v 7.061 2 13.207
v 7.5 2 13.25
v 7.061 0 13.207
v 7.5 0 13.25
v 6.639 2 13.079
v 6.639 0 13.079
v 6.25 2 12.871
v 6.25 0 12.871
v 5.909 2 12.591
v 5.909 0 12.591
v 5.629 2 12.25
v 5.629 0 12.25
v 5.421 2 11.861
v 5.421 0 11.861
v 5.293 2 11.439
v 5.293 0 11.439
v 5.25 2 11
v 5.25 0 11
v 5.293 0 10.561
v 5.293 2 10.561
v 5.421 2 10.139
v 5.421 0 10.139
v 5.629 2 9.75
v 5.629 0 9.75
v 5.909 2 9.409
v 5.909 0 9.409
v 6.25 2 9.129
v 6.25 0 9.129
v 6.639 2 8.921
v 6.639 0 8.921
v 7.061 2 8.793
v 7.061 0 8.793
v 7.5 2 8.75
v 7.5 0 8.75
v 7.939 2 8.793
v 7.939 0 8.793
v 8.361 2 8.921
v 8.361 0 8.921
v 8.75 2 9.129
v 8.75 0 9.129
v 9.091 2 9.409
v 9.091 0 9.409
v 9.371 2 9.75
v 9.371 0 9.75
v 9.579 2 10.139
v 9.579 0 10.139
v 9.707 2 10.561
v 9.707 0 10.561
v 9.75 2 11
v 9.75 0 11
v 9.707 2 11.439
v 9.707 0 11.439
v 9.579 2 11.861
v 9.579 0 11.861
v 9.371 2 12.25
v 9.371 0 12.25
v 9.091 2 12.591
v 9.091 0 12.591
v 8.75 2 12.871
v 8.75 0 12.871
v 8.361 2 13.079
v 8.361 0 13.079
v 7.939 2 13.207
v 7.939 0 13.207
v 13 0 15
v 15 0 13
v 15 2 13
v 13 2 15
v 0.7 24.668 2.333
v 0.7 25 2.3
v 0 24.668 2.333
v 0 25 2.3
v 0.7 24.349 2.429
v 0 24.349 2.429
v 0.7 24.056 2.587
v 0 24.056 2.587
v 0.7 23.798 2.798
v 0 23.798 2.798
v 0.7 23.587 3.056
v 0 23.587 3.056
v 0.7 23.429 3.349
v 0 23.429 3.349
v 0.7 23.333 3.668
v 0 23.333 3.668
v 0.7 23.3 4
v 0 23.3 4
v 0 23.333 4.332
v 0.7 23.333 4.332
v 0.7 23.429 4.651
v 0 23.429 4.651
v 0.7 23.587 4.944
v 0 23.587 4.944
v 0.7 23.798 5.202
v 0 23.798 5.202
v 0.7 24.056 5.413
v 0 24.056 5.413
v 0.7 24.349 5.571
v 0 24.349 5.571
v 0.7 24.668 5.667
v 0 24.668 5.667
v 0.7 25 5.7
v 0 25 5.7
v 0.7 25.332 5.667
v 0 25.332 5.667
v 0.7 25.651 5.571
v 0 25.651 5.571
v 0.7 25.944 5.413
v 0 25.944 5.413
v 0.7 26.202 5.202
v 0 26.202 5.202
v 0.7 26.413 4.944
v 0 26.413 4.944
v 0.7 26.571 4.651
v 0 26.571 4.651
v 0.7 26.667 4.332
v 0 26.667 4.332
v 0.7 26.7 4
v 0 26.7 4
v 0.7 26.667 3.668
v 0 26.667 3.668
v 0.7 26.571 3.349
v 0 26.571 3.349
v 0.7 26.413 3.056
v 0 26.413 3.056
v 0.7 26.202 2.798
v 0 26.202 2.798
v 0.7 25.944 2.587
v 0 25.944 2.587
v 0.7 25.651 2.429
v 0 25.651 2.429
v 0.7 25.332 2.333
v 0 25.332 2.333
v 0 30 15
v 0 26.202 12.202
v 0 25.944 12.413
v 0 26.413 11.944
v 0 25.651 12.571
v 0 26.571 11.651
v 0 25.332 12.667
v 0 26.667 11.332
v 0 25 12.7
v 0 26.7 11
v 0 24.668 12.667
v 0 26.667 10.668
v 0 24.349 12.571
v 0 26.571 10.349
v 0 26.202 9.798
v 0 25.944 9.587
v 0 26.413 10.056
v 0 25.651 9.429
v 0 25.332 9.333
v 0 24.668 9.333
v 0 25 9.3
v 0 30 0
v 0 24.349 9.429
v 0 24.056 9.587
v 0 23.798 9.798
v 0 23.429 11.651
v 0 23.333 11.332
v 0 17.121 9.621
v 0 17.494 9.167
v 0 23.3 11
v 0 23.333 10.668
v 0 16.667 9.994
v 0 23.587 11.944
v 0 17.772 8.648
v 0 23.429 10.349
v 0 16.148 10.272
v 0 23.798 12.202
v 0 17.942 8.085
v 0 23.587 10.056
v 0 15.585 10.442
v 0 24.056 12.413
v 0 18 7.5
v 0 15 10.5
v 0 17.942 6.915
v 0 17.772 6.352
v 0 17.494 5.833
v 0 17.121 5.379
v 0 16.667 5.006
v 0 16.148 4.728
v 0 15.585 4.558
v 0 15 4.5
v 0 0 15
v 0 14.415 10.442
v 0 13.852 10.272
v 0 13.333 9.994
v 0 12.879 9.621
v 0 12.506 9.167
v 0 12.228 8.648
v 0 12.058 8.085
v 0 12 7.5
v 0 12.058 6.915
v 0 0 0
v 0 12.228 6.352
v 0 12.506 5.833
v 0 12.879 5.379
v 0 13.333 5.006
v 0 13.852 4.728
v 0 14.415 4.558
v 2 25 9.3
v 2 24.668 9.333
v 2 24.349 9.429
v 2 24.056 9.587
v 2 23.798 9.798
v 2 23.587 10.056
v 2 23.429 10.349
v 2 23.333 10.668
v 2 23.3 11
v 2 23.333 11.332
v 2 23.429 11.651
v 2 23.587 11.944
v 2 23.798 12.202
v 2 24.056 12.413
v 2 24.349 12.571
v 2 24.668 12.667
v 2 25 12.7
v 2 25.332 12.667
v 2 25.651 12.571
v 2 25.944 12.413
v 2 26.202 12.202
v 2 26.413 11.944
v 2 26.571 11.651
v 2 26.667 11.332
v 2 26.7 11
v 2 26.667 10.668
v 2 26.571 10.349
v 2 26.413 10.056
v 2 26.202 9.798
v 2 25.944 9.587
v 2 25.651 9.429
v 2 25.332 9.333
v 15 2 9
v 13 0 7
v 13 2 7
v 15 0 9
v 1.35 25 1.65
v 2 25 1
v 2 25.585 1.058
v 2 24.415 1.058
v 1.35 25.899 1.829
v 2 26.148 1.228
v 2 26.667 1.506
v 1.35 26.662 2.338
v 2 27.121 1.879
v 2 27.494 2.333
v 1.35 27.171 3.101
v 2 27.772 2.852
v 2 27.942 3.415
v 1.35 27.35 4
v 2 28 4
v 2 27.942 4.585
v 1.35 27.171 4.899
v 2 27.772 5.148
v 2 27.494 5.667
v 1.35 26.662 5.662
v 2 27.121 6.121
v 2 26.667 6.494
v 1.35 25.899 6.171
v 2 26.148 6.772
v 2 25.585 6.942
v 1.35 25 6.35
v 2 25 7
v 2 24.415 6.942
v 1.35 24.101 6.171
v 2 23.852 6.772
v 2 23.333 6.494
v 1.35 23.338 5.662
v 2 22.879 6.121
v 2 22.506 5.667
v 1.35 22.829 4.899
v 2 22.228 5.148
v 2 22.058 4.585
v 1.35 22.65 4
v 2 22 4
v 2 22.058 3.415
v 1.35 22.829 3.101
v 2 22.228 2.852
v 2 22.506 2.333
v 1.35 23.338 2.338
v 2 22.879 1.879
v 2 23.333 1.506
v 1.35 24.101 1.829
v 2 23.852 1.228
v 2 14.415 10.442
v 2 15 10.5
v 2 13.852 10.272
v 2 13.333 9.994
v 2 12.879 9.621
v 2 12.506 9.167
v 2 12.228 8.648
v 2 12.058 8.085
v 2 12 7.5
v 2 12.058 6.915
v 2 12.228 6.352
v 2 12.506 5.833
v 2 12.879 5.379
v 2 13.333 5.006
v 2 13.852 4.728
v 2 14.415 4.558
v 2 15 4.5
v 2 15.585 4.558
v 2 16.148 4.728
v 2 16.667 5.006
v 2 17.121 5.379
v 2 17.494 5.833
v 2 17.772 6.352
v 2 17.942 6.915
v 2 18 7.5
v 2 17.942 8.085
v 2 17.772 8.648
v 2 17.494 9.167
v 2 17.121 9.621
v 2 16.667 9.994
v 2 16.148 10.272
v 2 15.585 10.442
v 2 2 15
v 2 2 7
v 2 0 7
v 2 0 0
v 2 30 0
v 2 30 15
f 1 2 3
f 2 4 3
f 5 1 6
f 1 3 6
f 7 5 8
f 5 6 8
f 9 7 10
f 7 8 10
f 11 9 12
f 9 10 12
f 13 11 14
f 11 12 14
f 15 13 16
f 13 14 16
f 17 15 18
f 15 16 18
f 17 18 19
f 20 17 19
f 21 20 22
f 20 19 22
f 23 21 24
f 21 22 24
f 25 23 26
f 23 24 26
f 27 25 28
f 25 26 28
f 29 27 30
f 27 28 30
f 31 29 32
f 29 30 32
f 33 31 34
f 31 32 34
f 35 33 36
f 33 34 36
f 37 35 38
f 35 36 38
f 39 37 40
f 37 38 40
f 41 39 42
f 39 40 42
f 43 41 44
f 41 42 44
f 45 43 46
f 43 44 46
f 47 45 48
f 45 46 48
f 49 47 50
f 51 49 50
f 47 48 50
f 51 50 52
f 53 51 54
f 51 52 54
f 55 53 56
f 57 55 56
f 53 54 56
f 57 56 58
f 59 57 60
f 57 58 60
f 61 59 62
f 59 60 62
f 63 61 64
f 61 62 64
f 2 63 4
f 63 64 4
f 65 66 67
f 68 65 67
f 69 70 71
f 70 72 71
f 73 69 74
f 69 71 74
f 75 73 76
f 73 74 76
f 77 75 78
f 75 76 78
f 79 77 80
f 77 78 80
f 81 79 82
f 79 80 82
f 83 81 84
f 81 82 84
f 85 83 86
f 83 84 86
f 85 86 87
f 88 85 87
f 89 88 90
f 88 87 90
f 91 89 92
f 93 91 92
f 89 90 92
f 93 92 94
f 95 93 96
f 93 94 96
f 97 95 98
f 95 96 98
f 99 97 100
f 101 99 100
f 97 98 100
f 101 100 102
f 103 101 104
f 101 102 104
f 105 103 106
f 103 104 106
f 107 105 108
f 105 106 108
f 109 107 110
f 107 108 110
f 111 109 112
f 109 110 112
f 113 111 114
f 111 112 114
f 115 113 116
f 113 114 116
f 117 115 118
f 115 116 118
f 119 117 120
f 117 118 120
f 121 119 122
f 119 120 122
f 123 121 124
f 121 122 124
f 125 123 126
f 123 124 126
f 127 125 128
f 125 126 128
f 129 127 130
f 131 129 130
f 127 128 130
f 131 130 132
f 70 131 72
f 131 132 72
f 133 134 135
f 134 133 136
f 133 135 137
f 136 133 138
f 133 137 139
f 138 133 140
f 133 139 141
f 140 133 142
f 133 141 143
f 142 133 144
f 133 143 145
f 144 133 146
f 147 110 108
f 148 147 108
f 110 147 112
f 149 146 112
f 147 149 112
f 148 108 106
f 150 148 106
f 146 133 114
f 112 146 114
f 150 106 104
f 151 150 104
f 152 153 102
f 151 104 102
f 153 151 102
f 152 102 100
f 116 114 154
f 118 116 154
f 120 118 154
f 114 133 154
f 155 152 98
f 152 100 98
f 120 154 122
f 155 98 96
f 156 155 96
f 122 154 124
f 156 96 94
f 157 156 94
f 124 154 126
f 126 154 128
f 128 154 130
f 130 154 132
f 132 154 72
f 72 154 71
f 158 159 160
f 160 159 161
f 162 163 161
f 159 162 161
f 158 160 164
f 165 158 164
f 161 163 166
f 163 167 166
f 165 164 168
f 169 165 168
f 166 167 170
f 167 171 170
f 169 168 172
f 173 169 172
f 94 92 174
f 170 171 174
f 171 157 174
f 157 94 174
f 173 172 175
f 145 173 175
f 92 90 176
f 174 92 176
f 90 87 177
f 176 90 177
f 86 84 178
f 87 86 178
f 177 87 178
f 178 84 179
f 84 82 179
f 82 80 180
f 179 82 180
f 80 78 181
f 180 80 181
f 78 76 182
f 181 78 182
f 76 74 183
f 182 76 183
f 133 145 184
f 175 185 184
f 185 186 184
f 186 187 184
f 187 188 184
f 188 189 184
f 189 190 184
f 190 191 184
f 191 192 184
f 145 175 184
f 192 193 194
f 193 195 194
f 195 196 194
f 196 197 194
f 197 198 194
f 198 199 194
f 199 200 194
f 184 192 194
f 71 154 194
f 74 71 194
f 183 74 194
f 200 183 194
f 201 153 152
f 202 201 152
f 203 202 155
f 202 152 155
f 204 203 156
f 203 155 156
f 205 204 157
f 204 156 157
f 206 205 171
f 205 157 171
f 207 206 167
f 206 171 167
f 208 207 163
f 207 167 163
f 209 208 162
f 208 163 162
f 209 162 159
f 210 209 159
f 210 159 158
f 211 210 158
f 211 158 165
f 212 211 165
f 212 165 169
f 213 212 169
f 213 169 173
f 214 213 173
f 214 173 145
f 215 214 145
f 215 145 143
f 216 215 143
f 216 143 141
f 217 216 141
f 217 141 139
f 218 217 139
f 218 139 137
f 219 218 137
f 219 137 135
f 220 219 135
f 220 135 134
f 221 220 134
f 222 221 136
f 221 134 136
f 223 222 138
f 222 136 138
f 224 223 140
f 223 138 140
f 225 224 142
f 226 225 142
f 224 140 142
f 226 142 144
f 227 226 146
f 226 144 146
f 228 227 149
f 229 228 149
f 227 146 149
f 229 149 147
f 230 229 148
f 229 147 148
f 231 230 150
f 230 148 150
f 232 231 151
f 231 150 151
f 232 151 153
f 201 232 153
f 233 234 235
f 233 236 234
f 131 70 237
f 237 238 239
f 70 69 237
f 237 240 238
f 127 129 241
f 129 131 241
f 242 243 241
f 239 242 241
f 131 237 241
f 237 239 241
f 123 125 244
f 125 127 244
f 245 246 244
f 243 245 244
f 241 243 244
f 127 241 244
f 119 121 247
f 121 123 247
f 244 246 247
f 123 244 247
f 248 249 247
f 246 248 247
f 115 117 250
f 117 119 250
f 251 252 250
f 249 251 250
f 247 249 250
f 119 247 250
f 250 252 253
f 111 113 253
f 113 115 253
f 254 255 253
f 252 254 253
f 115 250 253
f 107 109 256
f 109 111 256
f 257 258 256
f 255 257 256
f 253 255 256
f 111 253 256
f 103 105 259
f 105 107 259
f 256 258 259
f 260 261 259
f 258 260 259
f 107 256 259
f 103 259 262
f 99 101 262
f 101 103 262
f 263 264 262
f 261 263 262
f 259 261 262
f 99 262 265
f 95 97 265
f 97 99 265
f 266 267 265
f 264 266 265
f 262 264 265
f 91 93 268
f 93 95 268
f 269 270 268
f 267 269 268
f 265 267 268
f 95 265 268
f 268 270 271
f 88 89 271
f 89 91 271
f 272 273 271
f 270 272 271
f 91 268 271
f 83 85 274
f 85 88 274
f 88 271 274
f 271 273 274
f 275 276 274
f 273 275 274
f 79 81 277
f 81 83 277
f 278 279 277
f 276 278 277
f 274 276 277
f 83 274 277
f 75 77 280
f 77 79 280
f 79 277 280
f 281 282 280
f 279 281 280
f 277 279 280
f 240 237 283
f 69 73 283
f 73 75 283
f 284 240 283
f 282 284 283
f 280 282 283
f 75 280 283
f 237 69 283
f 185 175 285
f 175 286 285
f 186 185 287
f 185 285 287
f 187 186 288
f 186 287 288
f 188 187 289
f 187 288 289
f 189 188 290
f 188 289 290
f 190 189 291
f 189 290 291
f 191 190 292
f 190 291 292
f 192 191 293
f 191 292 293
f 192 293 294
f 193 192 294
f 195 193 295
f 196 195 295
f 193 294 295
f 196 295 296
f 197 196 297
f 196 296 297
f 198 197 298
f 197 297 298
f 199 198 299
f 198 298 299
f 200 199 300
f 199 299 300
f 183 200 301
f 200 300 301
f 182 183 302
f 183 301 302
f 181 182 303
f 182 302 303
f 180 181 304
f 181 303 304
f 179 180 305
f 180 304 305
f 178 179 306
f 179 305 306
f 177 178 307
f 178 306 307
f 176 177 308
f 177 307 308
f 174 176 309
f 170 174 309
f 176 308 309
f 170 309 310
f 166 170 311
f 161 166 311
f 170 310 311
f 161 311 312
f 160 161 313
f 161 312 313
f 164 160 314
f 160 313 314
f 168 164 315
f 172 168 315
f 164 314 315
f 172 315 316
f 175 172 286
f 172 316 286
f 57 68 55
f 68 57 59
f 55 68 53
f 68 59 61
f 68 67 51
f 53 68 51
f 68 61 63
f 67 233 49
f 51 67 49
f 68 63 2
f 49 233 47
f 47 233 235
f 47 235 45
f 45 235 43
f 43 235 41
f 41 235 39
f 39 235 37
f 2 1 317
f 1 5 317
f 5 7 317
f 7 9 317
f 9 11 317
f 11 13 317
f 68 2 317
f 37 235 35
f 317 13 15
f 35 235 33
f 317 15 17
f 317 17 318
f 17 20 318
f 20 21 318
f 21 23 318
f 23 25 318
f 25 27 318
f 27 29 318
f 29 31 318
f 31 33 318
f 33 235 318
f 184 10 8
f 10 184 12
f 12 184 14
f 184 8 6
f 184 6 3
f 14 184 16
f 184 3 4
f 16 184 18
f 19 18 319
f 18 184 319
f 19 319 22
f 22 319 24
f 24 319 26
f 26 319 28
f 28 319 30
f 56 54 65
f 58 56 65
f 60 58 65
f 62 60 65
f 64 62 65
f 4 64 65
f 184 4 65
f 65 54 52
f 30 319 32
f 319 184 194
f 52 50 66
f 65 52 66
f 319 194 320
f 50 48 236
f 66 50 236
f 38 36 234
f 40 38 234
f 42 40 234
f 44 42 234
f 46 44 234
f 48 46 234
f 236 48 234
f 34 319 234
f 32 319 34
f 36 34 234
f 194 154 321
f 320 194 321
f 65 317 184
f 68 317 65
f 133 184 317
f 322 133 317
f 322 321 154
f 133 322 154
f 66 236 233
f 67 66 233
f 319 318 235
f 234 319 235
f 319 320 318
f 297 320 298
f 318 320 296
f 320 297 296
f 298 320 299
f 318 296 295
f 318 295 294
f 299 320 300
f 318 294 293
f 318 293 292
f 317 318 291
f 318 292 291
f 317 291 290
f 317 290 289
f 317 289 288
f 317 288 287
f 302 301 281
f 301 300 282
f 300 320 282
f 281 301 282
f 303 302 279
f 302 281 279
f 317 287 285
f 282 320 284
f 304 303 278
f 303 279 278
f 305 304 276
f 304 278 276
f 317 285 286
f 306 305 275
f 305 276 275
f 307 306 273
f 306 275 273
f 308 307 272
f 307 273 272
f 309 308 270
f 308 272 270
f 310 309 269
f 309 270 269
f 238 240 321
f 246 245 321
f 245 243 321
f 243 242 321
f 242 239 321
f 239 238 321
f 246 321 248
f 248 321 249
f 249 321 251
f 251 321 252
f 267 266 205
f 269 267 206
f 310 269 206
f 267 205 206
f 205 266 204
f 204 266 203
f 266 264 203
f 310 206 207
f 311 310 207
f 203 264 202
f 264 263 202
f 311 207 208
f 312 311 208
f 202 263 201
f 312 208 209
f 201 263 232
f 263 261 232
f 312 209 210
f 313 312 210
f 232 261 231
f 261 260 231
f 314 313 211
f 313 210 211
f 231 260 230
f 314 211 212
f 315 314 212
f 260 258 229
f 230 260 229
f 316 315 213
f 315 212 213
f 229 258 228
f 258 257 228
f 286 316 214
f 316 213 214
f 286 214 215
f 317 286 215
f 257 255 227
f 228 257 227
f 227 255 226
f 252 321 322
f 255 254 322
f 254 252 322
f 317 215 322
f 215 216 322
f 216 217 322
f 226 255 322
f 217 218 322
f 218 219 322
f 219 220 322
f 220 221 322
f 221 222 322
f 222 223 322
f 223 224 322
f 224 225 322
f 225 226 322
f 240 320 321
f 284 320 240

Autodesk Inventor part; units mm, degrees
ref_plane "YZ Plane" through (0, 0, 0) normal (1, 0, 0) x (0, 1, 0)
ref_plane "XZ Plane" through (0, 0, 0) normal (0, 1, 0) x (-1, 0, 0)
ref_plane "XY Plane" through (0, 0, 0) normal (0, 0, 1) x (1, 0, 0)
sketch "Skizze1" plane through (0, 0, 0) normal (0, 0, 1) x (1, 0, 0)
  line L0 (0, 0) -> (1.7032, 0)
  line L1 (2, 2) -> (2, 30)
  line L2 (2, 30) -> (0, 30)
  line L3 (0, 30) -> (0, 0)
  line L4 (0, 0) -> (15, 0)
  line L5 (15, 0) -> (15, 2)
  line L6 (15, 2) -> (2, 2)
  line L7 (0, 2.129) -> (0, 0)
  dimension "d0" = 30
  dimension "d1" = 15
  dimension "d2" = 2
extrude "Extrusion1" add sketch "Skizze1" along normal blind 15
sketch "Skizze2" plane through (0, 0, 0) normal (-1, 0, 0) x (0, 0, 1)
  line L0 (0, 30) -> (15, 30) projected
  line L1 (0, 0) -> (0, 30) projected
  line L2 (0, 0) -> (15, 0) projected
  line L3 (0, -6) -> (0, 36) projected
  line L4 (-3, 0) -> (18, 0) projected
  line L5 (7.5, 30) -> (7.5, 0)
  point P0 (7.5, 15)
  dimension "d5" = 30
  dimension "d6" = 7.5
  dimension "d7" = 15
hole "Bohrung1" at (0, 15, 7.5) direction (1, 0, 0) diameter 6 end through all
sketch "Skizze3" plane through (2, 2, 0) normal (0, 1, 0) x (1, 0, 0)
  line L0 (0, -15) -> (13, -15) projected
  line L1 (0, 0) -> (0, -15) projected
  line L2 (13, 0) -> (0, 0)
  line L3 (0, 0) -> (0, -7)
  line L4 (0, -7) -> (13, -7)
  line L5 (13, -7) -> (13, 0)
  point P0 (-2, 0)
  dimension "d15" = 8
extrude "Extrusion2" cut sketch "Skizze3" against normal through all
sketch "Skizze4" plane through (2, 0, 0) normal (1, 0, 0) x (0, 0, -1)
  line L0 (-15, 30) -> (-15, 2) projected
  line L1 (0, 30) -> (0, 0) projected
  line L2 (0, 30) -> (-15, 30) projected
  line L3 (-15, 27.5) -> (0, 27.5)
  line L4 (-15, 22) -> (0, 22)
  point P0 (-11, 25)
  point P1 (-4, 25)
  dimension "d18" = 2.5
  dimension "d19" = 8
  dimension "d20" = 5
  dimension "d21" = 5
  dimension "d22" = 4
  dimension "d23" = 4
hole "Bohrung2" at (2, 25, 11) at (2, 25, 4) direction (-1, 0, 0) diameter 3.4 end through all
sketch "Skizze5" plane through (2, 2, 15) normal (0, 1, 0) x (1, 0, 0)
  line L0 (13, 8) -> (0, 8) projected
  line L1 (13, 8) -> (13, 0) projected
  point P0 (-2, 15)
  point P1 (5.5, 4)
  dimension "d31" = 7.5
  dimension "d32" = 4
hole "Bohrung3" at (7.5, 2, 11) direction (0, -1, 0) diameter 4.5 end through all
hole "Bohrung4" at (2, 25, 4) direction (-1, 0, 0) diameter 3.4 end through all countersink diameter 6 countersink angle 90
chamfer "Fase1" distance 2 angle 45 2 edges at (15, 1, 15) (15, 1, 7)
properties part number "13_0204_051"
